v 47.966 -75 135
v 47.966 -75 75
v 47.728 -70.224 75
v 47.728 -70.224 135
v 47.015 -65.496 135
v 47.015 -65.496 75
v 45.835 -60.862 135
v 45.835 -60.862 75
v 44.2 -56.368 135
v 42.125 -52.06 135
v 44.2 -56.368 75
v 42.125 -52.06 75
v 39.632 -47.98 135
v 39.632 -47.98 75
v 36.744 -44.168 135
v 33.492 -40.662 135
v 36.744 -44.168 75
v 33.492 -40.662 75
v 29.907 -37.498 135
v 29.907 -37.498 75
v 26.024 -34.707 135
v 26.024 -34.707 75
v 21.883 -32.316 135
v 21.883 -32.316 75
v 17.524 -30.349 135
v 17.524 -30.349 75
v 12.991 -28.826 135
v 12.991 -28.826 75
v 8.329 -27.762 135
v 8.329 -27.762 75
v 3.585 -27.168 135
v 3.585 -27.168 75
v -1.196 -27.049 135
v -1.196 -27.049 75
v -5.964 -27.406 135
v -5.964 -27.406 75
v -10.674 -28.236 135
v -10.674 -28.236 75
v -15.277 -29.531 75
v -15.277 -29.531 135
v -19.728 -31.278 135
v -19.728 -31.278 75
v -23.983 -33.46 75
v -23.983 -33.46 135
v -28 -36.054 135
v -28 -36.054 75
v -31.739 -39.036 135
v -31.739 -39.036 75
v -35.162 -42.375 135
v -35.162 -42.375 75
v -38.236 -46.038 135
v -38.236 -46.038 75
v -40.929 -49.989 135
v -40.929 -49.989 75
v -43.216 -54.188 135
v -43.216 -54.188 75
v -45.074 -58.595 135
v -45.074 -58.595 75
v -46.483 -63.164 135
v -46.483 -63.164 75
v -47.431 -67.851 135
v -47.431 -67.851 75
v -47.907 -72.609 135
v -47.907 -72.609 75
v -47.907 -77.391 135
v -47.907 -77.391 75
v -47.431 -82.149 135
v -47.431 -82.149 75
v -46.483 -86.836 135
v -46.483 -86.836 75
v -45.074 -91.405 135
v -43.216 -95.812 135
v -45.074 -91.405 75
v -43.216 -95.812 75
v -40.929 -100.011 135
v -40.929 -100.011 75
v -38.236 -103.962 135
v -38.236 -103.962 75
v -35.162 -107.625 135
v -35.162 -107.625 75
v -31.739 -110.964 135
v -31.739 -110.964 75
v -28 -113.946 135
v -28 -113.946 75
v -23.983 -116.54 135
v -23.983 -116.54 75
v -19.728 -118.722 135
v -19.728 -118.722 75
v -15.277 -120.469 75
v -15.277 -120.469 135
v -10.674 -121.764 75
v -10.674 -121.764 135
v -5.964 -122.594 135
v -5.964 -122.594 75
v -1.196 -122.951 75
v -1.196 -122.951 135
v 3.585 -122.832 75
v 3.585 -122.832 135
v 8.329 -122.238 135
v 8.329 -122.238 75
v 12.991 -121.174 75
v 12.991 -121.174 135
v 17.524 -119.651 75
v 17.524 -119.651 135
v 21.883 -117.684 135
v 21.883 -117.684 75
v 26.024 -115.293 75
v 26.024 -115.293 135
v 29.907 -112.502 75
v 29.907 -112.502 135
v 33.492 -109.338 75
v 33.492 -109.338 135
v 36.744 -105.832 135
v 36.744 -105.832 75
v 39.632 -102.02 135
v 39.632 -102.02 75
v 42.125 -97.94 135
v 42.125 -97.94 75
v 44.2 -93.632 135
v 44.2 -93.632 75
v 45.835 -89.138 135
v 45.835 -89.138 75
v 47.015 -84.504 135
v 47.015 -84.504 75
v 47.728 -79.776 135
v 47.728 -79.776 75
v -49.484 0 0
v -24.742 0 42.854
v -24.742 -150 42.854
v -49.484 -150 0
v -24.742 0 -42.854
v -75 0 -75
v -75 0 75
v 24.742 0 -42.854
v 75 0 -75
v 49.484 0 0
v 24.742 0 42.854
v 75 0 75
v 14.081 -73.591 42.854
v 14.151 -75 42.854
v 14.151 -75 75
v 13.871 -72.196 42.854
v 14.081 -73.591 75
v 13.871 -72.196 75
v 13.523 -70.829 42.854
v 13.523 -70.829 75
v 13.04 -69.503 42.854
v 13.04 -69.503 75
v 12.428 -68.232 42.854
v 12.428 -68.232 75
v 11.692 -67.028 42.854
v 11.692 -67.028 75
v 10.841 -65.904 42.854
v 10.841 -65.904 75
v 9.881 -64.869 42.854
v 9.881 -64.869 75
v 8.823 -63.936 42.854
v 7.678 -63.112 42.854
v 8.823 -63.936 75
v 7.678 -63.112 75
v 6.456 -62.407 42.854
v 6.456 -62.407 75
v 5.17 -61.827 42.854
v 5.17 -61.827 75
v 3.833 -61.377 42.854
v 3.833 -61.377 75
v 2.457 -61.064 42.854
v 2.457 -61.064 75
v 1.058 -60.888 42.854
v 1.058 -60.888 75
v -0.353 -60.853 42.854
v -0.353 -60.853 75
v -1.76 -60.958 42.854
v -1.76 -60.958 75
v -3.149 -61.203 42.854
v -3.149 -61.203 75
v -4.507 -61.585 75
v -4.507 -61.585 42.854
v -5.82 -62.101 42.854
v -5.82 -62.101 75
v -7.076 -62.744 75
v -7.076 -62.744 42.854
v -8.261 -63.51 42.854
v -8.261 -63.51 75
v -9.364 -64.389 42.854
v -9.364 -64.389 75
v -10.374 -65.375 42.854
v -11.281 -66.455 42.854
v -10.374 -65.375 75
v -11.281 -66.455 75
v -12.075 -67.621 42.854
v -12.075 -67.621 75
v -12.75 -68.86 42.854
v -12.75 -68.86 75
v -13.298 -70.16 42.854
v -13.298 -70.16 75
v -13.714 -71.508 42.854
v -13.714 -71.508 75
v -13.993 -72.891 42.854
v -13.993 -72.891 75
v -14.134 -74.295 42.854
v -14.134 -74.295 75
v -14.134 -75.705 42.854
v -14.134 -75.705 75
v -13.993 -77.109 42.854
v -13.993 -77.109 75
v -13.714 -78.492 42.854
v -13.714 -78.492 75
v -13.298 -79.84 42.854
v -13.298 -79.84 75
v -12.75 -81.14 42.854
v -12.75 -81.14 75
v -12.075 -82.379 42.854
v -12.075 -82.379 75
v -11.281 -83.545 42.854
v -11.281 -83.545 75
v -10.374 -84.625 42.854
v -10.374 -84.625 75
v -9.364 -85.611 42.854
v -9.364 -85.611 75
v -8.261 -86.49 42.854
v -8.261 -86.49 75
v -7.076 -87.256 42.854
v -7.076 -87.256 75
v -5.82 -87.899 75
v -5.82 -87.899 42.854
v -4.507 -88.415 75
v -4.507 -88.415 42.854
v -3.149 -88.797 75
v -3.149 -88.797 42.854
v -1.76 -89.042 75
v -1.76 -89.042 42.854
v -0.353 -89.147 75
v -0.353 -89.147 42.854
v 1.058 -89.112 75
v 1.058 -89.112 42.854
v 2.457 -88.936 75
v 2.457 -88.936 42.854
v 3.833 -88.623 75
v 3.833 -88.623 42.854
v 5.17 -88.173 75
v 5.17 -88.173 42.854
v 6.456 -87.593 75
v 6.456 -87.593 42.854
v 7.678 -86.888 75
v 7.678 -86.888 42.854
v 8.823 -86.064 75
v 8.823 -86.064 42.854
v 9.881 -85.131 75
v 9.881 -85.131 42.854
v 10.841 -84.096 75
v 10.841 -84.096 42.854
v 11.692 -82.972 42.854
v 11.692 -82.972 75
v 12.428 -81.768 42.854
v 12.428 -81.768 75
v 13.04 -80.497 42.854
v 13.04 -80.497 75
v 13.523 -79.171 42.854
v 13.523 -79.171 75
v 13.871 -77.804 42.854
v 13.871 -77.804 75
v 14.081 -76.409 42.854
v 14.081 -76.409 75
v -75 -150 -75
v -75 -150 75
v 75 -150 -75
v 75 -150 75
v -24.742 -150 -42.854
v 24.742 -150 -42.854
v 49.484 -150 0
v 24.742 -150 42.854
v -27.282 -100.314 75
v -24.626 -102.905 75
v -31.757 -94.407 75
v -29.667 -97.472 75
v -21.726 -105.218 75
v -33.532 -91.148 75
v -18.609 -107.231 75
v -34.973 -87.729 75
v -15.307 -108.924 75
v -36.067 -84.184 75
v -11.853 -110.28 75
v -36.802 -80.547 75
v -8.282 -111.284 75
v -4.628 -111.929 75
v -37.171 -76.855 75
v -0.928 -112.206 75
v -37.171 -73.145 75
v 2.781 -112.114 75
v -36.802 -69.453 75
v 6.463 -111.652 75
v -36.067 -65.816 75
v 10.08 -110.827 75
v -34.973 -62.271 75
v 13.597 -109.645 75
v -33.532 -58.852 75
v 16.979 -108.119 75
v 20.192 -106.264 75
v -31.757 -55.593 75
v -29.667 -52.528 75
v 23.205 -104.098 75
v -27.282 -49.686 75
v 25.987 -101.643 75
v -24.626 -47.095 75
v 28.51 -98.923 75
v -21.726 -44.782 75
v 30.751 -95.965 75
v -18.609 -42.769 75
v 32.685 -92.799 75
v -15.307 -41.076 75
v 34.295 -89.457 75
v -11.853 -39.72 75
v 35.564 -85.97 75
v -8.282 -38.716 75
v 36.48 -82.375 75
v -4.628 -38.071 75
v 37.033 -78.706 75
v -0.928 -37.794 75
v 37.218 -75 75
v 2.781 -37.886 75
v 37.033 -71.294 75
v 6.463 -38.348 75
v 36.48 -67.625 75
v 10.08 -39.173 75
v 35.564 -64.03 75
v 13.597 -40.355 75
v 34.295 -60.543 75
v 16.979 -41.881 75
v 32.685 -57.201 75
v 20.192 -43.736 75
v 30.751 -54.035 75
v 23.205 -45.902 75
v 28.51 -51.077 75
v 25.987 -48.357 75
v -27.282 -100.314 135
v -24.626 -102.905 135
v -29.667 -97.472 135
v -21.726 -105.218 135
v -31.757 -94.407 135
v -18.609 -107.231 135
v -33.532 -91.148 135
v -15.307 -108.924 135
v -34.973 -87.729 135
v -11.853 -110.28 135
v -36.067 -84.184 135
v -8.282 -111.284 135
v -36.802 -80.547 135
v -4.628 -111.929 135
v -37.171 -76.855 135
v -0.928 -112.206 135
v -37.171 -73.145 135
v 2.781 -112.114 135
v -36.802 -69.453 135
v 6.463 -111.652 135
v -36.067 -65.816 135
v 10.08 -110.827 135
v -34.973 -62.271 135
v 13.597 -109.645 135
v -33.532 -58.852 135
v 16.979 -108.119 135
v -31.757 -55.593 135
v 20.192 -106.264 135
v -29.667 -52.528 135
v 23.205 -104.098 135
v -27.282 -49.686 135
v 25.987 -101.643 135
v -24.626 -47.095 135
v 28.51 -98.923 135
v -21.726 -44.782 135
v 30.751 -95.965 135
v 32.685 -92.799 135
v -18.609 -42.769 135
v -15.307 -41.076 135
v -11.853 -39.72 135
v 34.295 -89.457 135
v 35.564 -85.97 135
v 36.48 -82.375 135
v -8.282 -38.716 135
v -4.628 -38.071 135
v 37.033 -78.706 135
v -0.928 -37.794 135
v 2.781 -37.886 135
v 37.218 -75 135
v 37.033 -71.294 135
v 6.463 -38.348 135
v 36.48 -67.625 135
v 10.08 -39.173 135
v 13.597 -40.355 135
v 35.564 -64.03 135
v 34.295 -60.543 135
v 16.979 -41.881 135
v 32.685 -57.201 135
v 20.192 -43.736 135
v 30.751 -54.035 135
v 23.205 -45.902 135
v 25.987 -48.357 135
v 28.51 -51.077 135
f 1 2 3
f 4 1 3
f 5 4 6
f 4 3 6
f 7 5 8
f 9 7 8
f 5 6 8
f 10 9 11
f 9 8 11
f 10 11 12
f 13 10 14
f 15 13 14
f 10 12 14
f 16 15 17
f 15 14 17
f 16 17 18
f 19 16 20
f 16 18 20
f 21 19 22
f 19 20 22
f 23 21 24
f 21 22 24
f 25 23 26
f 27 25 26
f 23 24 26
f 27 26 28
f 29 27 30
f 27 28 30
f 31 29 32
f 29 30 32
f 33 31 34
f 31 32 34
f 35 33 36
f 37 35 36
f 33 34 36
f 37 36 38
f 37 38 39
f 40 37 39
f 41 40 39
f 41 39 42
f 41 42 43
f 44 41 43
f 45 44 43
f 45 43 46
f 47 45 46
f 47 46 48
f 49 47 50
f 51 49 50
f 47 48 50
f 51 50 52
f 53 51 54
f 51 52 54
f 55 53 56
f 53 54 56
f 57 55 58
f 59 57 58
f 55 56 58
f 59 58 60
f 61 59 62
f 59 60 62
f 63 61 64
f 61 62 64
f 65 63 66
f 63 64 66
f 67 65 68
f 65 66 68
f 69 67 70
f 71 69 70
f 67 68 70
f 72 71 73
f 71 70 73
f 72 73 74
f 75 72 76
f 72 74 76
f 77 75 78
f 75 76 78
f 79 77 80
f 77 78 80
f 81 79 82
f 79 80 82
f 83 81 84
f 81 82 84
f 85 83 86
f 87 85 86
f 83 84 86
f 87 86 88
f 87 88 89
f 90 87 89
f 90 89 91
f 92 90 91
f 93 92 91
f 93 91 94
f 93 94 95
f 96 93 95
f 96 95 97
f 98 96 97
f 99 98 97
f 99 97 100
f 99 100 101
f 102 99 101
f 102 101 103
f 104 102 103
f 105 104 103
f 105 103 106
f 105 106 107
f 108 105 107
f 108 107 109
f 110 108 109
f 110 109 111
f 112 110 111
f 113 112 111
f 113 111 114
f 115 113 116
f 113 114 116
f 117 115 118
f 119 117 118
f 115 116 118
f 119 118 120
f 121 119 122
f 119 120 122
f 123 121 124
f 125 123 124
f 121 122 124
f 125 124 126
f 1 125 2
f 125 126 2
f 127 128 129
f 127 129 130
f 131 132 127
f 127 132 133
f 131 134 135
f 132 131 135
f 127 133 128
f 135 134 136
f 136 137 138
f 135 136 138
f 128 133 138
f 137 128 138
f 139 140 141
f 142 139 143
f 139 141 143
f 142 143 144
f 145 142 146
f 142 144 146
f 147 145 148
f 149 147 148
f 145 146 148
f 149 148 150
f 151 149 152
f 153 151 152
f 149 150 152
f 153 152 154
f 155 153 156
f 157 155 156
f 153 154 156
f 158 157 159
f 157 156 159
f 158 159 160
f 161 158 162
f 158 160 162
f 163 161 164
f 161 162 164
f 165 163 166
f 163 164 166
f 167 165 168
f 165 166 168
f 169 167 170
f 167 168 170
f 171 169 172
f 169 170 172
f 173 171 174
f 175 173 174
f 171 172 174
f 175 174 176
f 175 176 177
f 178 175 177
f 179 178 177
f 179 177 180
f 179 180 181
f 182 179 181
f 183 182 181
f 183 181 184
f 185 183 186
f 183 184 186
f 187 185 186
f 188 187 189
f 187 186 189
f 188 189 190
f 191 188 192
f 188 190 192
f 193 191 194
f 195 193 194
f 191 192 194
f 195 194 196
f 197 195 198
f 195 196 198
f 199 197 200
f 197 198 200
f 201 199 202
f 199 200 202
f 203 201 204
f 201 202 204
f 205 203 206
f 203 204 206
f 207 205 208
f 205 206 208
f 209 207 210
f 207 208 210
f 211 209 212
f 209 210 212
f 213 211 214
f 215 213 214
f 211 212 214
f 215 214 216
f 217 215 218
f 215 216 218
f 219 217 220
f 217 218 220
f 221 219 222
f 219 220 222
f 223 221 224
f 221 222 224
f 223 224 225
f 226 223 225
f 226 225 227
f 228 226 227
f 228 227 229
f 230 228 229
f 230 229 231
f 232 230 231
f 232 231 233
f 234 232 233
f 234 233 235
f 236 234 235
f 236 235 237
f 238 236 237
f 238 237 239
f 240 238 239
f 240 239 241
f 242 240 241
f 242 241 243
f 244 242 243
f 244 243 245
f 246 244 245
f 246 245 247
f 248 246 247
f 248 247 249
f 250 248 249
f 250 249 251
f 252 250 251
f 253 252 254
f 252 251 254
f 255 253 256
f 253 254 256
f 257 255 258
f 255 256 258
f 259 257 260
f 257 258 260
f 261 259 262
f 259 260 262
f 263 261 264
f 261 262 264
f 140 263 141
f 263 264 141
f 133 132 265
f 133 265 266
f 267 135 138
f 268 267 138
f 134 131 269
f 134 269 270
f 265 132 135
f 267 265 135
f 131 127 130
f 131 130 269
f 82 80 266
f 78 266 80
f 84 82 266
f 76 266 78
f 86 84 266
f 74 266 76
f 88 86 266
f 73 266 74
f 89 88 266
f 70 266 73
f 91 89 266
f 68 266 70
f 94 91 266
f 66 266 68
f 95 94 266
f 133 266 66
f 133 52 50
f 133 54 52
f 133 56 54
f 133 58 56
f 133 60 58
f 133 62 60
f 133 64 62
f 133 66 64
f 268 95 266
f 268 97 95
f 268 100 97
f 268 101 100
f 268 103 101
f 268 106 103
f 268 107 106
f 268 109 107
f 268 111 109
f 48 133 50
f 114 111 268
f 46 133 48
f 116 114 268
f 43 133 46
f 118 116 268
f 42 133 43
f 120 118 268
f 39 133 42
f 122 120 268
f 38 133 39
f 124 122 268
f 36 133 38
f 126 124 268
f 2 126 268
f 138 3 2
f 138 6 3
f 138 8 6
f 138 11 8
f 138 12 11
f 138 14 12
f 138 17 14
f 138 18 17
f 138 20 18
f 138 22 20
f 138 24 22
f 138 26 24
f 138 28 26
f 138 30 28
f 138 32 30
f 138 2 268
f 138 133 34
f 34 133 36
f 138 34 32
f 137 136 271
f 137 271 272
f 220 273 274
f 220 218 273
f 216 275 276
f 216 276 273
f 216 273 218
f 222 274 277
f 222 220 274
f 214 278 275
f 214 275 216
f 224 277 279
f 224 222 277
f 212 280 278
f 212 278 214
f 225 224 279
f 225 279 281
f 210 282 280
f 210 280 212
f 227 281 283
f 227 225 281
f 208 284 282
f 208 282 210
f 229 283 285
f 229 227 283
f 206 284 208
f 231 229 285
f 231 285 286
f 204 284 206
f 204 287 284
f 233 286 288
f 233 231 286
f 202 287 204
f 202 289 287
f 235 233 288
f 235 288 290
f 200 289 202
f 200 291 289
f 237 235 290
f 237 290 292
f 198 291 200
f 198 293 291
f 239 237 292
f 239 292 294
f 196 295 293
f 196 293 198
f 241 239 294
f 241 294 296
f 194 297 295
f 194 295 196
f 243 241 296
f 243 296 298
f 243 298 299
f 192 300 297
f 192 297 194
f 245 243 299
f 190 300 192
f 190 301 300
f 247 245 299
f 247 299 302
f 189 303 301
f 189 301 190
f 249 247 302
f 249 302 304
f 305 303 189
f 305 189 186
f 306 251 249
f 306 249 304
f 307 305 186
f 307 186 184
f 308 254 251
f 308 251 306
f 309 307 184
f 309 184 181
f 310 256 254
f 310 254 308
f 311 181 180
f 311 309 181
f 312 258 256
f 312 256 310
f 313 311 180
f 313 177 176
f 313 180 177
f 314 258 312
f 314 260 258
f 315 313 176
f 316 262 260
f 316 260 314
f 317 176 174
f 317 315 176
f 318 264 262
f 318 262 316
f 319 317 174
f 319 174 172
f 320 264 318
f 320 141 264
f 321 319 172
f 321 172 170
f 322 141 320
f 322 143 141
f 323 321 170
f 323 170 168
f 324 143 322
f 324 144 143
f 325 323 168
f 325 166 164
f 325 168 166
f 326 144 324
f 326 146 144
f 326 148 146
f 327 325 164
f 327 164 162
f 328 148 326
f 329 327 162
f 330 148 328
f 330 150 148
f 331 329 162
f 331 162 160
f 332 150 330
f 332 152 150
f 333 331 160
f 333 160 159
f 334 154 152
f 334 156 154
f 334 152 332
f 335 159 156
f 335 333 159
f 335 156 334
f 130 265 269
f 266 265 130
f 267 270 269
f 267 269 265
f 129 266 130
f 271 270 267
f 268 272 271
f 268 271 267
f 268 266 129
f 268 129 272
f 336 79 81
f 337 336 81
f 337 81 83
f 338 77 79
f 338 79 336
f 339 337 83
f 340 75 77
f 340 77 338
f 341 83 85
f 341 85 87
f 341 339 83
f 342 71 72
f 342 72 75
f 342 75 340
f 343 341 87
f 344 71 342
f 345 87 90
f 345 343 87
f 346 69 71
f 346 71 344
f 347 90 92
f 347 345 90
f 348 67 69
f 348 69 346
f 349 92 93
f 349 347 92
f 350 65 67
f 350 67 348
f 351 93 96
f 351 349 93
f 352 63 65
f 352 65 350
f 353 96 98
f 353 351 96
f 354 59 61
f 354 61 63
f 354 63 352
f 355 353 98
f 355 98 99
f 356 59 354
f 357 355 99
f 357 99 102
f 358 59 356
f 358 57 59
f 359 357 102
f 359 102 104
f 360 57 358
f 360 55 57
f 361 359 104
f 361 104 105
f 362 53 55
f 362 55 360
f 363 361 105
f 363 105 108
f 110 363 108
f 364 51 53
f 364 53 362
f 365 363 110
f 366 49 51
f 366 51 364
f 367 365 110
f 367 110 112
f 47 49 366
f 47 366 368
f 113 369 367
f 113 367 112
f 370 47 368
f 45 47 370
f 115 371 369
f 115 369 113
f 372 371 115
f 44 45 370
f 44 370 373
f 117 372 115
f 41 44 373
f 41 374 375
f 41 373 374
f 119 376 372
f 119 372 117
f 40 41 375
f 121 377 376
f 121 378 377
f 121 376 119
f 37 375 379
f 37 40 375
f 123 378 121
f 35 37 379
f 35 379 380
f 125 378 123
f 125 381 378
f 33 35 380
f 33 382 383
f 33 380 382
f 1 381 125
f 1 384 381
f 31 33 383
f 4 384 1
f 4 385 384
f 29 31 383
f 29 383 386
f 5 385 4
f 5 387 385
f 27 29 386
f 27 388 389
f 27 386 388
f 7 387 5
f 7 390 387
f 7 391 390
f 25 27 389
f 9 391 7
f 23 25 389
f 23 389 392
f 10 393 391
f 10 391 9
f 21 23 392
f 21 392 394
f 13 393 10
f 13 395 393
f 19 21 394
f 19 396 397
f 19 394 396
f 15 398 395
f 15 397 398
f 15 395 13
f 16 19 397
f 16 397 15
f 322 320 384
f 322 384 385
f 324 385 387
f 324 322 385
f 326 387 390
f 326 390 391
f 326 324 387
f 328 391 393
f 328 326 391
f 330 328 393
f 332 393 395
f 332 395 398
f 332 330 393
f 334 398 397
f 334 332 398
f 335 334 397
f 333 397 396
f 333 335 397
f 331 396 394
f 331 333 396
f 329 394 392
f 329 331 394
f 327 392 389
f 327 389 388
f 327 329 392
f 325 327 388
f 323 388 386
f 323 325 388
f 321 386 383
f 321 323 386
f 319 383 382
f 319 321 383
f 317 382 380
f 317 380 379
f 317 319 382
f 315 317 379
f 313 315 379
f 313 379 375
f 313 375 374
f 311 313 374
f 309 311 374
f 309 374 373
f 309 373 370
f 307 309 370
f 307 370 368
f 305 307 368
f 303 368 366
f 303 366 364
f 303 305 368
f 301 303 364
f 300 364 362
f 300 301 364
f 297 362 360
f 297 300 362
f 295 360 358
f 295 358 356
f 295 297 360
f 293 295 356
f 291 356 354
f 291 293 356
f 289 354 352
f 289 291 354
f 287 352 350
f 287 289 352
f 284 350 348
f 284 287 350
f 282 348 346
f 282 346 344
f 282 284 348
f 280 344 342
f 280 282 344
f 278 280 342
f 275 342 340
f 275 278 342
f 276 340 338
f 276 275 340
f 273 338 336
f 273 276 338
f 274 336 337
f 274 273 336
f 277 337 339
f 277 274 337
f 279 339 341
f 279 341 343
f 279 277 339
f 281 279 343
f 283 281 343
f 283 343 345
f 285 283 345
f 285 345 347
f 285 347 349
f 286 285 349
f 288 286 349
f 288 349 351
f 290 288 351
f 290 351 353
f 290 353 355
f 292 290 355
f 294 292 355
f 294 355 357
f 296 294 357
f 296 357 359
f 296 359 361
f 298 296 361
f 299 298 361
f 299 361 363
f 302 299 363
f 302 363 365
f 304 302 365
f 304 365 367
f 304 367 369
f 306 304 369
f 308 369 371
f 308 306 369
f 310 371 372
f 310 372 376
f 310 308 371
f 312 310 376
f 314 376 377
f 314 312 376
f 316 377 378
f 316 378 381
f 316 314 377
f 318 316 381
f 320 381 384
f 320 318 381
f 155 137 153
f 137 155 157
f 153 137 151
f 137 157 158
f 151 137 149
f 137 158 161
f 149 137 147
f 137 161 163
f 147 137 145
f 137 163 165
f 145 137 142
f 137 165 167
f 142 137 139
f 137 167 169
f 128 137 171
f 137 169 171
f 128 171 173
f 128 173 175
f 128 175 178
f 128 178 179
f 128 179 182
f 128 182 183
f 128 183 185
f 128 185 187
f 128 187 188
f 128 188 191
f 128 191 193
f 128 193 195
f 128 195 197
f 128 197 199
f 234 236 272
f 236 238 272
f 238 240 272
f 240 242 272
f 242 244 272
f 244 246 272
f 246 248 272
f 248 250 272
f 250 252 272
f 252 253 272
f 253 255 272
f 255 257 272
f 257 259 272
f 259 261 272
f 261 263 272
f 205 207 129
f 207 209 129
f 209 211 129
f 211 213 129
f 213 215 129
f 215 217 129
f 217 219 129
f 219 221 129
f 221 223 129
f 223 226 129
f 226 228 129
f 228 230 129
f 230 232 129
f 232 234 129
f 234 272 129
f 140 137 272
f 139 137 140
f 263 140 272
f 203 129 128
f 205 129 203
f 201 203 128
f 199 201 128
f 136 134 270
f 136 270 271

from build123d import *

# Parameters (mm, degrees)
F0_W     = 150
F0_H     = 150
F1_DEPTH = 150
F2_R     = 47.966338
F2_R_2   = 37.217605
F3_DEPTH = 60
F5_DEPTH = 150.001
F6_R     = 14.151474
F7_DEPTH = 32.145534


with BuildPart() as f1:
    # F0 (on Front) → F1 (new body)
    with BuildSketch(Plane.XZ):
        Rectangle(F0_W, F0_H)
    extrude(amount=F1_DEPTH)

    # F2 (on face) → F3 (join)
    with BuildSketch(Plane.XY.offset(75)):
        with Locations((0, -75)):
            Circle(F2_R)
        with Locations((0, -75)):
            Circle(F2_R_2, mode=Mode.SUBTRACT)
    extrude(amount=F3_DEPTH)

    # F4 (on face) → F5 (cut, through all)
    with BuildSketch(Plane.XZ.offset(150)):
        Polygon((49.484075, 0), (24.742038, 42.854466), (-24.742038, 42.854466), (-49.484075, 0), (-24.742038, -42.854466), (24.742038, -42.854466), align=None)
    extrude(amount=-F5_DEPTH, mode=Mode.SUBTRACT)

    # F6 (on face) → F7 (cut, through all)
    with BuildSketch(Plane.XY.offset(75)):
        with Locations((0, -75)):
            Circle(F6_R)
    extrude(amount=-F7_DEPTH, mode=Mode.SUBTRACT)


solid = f1.part
